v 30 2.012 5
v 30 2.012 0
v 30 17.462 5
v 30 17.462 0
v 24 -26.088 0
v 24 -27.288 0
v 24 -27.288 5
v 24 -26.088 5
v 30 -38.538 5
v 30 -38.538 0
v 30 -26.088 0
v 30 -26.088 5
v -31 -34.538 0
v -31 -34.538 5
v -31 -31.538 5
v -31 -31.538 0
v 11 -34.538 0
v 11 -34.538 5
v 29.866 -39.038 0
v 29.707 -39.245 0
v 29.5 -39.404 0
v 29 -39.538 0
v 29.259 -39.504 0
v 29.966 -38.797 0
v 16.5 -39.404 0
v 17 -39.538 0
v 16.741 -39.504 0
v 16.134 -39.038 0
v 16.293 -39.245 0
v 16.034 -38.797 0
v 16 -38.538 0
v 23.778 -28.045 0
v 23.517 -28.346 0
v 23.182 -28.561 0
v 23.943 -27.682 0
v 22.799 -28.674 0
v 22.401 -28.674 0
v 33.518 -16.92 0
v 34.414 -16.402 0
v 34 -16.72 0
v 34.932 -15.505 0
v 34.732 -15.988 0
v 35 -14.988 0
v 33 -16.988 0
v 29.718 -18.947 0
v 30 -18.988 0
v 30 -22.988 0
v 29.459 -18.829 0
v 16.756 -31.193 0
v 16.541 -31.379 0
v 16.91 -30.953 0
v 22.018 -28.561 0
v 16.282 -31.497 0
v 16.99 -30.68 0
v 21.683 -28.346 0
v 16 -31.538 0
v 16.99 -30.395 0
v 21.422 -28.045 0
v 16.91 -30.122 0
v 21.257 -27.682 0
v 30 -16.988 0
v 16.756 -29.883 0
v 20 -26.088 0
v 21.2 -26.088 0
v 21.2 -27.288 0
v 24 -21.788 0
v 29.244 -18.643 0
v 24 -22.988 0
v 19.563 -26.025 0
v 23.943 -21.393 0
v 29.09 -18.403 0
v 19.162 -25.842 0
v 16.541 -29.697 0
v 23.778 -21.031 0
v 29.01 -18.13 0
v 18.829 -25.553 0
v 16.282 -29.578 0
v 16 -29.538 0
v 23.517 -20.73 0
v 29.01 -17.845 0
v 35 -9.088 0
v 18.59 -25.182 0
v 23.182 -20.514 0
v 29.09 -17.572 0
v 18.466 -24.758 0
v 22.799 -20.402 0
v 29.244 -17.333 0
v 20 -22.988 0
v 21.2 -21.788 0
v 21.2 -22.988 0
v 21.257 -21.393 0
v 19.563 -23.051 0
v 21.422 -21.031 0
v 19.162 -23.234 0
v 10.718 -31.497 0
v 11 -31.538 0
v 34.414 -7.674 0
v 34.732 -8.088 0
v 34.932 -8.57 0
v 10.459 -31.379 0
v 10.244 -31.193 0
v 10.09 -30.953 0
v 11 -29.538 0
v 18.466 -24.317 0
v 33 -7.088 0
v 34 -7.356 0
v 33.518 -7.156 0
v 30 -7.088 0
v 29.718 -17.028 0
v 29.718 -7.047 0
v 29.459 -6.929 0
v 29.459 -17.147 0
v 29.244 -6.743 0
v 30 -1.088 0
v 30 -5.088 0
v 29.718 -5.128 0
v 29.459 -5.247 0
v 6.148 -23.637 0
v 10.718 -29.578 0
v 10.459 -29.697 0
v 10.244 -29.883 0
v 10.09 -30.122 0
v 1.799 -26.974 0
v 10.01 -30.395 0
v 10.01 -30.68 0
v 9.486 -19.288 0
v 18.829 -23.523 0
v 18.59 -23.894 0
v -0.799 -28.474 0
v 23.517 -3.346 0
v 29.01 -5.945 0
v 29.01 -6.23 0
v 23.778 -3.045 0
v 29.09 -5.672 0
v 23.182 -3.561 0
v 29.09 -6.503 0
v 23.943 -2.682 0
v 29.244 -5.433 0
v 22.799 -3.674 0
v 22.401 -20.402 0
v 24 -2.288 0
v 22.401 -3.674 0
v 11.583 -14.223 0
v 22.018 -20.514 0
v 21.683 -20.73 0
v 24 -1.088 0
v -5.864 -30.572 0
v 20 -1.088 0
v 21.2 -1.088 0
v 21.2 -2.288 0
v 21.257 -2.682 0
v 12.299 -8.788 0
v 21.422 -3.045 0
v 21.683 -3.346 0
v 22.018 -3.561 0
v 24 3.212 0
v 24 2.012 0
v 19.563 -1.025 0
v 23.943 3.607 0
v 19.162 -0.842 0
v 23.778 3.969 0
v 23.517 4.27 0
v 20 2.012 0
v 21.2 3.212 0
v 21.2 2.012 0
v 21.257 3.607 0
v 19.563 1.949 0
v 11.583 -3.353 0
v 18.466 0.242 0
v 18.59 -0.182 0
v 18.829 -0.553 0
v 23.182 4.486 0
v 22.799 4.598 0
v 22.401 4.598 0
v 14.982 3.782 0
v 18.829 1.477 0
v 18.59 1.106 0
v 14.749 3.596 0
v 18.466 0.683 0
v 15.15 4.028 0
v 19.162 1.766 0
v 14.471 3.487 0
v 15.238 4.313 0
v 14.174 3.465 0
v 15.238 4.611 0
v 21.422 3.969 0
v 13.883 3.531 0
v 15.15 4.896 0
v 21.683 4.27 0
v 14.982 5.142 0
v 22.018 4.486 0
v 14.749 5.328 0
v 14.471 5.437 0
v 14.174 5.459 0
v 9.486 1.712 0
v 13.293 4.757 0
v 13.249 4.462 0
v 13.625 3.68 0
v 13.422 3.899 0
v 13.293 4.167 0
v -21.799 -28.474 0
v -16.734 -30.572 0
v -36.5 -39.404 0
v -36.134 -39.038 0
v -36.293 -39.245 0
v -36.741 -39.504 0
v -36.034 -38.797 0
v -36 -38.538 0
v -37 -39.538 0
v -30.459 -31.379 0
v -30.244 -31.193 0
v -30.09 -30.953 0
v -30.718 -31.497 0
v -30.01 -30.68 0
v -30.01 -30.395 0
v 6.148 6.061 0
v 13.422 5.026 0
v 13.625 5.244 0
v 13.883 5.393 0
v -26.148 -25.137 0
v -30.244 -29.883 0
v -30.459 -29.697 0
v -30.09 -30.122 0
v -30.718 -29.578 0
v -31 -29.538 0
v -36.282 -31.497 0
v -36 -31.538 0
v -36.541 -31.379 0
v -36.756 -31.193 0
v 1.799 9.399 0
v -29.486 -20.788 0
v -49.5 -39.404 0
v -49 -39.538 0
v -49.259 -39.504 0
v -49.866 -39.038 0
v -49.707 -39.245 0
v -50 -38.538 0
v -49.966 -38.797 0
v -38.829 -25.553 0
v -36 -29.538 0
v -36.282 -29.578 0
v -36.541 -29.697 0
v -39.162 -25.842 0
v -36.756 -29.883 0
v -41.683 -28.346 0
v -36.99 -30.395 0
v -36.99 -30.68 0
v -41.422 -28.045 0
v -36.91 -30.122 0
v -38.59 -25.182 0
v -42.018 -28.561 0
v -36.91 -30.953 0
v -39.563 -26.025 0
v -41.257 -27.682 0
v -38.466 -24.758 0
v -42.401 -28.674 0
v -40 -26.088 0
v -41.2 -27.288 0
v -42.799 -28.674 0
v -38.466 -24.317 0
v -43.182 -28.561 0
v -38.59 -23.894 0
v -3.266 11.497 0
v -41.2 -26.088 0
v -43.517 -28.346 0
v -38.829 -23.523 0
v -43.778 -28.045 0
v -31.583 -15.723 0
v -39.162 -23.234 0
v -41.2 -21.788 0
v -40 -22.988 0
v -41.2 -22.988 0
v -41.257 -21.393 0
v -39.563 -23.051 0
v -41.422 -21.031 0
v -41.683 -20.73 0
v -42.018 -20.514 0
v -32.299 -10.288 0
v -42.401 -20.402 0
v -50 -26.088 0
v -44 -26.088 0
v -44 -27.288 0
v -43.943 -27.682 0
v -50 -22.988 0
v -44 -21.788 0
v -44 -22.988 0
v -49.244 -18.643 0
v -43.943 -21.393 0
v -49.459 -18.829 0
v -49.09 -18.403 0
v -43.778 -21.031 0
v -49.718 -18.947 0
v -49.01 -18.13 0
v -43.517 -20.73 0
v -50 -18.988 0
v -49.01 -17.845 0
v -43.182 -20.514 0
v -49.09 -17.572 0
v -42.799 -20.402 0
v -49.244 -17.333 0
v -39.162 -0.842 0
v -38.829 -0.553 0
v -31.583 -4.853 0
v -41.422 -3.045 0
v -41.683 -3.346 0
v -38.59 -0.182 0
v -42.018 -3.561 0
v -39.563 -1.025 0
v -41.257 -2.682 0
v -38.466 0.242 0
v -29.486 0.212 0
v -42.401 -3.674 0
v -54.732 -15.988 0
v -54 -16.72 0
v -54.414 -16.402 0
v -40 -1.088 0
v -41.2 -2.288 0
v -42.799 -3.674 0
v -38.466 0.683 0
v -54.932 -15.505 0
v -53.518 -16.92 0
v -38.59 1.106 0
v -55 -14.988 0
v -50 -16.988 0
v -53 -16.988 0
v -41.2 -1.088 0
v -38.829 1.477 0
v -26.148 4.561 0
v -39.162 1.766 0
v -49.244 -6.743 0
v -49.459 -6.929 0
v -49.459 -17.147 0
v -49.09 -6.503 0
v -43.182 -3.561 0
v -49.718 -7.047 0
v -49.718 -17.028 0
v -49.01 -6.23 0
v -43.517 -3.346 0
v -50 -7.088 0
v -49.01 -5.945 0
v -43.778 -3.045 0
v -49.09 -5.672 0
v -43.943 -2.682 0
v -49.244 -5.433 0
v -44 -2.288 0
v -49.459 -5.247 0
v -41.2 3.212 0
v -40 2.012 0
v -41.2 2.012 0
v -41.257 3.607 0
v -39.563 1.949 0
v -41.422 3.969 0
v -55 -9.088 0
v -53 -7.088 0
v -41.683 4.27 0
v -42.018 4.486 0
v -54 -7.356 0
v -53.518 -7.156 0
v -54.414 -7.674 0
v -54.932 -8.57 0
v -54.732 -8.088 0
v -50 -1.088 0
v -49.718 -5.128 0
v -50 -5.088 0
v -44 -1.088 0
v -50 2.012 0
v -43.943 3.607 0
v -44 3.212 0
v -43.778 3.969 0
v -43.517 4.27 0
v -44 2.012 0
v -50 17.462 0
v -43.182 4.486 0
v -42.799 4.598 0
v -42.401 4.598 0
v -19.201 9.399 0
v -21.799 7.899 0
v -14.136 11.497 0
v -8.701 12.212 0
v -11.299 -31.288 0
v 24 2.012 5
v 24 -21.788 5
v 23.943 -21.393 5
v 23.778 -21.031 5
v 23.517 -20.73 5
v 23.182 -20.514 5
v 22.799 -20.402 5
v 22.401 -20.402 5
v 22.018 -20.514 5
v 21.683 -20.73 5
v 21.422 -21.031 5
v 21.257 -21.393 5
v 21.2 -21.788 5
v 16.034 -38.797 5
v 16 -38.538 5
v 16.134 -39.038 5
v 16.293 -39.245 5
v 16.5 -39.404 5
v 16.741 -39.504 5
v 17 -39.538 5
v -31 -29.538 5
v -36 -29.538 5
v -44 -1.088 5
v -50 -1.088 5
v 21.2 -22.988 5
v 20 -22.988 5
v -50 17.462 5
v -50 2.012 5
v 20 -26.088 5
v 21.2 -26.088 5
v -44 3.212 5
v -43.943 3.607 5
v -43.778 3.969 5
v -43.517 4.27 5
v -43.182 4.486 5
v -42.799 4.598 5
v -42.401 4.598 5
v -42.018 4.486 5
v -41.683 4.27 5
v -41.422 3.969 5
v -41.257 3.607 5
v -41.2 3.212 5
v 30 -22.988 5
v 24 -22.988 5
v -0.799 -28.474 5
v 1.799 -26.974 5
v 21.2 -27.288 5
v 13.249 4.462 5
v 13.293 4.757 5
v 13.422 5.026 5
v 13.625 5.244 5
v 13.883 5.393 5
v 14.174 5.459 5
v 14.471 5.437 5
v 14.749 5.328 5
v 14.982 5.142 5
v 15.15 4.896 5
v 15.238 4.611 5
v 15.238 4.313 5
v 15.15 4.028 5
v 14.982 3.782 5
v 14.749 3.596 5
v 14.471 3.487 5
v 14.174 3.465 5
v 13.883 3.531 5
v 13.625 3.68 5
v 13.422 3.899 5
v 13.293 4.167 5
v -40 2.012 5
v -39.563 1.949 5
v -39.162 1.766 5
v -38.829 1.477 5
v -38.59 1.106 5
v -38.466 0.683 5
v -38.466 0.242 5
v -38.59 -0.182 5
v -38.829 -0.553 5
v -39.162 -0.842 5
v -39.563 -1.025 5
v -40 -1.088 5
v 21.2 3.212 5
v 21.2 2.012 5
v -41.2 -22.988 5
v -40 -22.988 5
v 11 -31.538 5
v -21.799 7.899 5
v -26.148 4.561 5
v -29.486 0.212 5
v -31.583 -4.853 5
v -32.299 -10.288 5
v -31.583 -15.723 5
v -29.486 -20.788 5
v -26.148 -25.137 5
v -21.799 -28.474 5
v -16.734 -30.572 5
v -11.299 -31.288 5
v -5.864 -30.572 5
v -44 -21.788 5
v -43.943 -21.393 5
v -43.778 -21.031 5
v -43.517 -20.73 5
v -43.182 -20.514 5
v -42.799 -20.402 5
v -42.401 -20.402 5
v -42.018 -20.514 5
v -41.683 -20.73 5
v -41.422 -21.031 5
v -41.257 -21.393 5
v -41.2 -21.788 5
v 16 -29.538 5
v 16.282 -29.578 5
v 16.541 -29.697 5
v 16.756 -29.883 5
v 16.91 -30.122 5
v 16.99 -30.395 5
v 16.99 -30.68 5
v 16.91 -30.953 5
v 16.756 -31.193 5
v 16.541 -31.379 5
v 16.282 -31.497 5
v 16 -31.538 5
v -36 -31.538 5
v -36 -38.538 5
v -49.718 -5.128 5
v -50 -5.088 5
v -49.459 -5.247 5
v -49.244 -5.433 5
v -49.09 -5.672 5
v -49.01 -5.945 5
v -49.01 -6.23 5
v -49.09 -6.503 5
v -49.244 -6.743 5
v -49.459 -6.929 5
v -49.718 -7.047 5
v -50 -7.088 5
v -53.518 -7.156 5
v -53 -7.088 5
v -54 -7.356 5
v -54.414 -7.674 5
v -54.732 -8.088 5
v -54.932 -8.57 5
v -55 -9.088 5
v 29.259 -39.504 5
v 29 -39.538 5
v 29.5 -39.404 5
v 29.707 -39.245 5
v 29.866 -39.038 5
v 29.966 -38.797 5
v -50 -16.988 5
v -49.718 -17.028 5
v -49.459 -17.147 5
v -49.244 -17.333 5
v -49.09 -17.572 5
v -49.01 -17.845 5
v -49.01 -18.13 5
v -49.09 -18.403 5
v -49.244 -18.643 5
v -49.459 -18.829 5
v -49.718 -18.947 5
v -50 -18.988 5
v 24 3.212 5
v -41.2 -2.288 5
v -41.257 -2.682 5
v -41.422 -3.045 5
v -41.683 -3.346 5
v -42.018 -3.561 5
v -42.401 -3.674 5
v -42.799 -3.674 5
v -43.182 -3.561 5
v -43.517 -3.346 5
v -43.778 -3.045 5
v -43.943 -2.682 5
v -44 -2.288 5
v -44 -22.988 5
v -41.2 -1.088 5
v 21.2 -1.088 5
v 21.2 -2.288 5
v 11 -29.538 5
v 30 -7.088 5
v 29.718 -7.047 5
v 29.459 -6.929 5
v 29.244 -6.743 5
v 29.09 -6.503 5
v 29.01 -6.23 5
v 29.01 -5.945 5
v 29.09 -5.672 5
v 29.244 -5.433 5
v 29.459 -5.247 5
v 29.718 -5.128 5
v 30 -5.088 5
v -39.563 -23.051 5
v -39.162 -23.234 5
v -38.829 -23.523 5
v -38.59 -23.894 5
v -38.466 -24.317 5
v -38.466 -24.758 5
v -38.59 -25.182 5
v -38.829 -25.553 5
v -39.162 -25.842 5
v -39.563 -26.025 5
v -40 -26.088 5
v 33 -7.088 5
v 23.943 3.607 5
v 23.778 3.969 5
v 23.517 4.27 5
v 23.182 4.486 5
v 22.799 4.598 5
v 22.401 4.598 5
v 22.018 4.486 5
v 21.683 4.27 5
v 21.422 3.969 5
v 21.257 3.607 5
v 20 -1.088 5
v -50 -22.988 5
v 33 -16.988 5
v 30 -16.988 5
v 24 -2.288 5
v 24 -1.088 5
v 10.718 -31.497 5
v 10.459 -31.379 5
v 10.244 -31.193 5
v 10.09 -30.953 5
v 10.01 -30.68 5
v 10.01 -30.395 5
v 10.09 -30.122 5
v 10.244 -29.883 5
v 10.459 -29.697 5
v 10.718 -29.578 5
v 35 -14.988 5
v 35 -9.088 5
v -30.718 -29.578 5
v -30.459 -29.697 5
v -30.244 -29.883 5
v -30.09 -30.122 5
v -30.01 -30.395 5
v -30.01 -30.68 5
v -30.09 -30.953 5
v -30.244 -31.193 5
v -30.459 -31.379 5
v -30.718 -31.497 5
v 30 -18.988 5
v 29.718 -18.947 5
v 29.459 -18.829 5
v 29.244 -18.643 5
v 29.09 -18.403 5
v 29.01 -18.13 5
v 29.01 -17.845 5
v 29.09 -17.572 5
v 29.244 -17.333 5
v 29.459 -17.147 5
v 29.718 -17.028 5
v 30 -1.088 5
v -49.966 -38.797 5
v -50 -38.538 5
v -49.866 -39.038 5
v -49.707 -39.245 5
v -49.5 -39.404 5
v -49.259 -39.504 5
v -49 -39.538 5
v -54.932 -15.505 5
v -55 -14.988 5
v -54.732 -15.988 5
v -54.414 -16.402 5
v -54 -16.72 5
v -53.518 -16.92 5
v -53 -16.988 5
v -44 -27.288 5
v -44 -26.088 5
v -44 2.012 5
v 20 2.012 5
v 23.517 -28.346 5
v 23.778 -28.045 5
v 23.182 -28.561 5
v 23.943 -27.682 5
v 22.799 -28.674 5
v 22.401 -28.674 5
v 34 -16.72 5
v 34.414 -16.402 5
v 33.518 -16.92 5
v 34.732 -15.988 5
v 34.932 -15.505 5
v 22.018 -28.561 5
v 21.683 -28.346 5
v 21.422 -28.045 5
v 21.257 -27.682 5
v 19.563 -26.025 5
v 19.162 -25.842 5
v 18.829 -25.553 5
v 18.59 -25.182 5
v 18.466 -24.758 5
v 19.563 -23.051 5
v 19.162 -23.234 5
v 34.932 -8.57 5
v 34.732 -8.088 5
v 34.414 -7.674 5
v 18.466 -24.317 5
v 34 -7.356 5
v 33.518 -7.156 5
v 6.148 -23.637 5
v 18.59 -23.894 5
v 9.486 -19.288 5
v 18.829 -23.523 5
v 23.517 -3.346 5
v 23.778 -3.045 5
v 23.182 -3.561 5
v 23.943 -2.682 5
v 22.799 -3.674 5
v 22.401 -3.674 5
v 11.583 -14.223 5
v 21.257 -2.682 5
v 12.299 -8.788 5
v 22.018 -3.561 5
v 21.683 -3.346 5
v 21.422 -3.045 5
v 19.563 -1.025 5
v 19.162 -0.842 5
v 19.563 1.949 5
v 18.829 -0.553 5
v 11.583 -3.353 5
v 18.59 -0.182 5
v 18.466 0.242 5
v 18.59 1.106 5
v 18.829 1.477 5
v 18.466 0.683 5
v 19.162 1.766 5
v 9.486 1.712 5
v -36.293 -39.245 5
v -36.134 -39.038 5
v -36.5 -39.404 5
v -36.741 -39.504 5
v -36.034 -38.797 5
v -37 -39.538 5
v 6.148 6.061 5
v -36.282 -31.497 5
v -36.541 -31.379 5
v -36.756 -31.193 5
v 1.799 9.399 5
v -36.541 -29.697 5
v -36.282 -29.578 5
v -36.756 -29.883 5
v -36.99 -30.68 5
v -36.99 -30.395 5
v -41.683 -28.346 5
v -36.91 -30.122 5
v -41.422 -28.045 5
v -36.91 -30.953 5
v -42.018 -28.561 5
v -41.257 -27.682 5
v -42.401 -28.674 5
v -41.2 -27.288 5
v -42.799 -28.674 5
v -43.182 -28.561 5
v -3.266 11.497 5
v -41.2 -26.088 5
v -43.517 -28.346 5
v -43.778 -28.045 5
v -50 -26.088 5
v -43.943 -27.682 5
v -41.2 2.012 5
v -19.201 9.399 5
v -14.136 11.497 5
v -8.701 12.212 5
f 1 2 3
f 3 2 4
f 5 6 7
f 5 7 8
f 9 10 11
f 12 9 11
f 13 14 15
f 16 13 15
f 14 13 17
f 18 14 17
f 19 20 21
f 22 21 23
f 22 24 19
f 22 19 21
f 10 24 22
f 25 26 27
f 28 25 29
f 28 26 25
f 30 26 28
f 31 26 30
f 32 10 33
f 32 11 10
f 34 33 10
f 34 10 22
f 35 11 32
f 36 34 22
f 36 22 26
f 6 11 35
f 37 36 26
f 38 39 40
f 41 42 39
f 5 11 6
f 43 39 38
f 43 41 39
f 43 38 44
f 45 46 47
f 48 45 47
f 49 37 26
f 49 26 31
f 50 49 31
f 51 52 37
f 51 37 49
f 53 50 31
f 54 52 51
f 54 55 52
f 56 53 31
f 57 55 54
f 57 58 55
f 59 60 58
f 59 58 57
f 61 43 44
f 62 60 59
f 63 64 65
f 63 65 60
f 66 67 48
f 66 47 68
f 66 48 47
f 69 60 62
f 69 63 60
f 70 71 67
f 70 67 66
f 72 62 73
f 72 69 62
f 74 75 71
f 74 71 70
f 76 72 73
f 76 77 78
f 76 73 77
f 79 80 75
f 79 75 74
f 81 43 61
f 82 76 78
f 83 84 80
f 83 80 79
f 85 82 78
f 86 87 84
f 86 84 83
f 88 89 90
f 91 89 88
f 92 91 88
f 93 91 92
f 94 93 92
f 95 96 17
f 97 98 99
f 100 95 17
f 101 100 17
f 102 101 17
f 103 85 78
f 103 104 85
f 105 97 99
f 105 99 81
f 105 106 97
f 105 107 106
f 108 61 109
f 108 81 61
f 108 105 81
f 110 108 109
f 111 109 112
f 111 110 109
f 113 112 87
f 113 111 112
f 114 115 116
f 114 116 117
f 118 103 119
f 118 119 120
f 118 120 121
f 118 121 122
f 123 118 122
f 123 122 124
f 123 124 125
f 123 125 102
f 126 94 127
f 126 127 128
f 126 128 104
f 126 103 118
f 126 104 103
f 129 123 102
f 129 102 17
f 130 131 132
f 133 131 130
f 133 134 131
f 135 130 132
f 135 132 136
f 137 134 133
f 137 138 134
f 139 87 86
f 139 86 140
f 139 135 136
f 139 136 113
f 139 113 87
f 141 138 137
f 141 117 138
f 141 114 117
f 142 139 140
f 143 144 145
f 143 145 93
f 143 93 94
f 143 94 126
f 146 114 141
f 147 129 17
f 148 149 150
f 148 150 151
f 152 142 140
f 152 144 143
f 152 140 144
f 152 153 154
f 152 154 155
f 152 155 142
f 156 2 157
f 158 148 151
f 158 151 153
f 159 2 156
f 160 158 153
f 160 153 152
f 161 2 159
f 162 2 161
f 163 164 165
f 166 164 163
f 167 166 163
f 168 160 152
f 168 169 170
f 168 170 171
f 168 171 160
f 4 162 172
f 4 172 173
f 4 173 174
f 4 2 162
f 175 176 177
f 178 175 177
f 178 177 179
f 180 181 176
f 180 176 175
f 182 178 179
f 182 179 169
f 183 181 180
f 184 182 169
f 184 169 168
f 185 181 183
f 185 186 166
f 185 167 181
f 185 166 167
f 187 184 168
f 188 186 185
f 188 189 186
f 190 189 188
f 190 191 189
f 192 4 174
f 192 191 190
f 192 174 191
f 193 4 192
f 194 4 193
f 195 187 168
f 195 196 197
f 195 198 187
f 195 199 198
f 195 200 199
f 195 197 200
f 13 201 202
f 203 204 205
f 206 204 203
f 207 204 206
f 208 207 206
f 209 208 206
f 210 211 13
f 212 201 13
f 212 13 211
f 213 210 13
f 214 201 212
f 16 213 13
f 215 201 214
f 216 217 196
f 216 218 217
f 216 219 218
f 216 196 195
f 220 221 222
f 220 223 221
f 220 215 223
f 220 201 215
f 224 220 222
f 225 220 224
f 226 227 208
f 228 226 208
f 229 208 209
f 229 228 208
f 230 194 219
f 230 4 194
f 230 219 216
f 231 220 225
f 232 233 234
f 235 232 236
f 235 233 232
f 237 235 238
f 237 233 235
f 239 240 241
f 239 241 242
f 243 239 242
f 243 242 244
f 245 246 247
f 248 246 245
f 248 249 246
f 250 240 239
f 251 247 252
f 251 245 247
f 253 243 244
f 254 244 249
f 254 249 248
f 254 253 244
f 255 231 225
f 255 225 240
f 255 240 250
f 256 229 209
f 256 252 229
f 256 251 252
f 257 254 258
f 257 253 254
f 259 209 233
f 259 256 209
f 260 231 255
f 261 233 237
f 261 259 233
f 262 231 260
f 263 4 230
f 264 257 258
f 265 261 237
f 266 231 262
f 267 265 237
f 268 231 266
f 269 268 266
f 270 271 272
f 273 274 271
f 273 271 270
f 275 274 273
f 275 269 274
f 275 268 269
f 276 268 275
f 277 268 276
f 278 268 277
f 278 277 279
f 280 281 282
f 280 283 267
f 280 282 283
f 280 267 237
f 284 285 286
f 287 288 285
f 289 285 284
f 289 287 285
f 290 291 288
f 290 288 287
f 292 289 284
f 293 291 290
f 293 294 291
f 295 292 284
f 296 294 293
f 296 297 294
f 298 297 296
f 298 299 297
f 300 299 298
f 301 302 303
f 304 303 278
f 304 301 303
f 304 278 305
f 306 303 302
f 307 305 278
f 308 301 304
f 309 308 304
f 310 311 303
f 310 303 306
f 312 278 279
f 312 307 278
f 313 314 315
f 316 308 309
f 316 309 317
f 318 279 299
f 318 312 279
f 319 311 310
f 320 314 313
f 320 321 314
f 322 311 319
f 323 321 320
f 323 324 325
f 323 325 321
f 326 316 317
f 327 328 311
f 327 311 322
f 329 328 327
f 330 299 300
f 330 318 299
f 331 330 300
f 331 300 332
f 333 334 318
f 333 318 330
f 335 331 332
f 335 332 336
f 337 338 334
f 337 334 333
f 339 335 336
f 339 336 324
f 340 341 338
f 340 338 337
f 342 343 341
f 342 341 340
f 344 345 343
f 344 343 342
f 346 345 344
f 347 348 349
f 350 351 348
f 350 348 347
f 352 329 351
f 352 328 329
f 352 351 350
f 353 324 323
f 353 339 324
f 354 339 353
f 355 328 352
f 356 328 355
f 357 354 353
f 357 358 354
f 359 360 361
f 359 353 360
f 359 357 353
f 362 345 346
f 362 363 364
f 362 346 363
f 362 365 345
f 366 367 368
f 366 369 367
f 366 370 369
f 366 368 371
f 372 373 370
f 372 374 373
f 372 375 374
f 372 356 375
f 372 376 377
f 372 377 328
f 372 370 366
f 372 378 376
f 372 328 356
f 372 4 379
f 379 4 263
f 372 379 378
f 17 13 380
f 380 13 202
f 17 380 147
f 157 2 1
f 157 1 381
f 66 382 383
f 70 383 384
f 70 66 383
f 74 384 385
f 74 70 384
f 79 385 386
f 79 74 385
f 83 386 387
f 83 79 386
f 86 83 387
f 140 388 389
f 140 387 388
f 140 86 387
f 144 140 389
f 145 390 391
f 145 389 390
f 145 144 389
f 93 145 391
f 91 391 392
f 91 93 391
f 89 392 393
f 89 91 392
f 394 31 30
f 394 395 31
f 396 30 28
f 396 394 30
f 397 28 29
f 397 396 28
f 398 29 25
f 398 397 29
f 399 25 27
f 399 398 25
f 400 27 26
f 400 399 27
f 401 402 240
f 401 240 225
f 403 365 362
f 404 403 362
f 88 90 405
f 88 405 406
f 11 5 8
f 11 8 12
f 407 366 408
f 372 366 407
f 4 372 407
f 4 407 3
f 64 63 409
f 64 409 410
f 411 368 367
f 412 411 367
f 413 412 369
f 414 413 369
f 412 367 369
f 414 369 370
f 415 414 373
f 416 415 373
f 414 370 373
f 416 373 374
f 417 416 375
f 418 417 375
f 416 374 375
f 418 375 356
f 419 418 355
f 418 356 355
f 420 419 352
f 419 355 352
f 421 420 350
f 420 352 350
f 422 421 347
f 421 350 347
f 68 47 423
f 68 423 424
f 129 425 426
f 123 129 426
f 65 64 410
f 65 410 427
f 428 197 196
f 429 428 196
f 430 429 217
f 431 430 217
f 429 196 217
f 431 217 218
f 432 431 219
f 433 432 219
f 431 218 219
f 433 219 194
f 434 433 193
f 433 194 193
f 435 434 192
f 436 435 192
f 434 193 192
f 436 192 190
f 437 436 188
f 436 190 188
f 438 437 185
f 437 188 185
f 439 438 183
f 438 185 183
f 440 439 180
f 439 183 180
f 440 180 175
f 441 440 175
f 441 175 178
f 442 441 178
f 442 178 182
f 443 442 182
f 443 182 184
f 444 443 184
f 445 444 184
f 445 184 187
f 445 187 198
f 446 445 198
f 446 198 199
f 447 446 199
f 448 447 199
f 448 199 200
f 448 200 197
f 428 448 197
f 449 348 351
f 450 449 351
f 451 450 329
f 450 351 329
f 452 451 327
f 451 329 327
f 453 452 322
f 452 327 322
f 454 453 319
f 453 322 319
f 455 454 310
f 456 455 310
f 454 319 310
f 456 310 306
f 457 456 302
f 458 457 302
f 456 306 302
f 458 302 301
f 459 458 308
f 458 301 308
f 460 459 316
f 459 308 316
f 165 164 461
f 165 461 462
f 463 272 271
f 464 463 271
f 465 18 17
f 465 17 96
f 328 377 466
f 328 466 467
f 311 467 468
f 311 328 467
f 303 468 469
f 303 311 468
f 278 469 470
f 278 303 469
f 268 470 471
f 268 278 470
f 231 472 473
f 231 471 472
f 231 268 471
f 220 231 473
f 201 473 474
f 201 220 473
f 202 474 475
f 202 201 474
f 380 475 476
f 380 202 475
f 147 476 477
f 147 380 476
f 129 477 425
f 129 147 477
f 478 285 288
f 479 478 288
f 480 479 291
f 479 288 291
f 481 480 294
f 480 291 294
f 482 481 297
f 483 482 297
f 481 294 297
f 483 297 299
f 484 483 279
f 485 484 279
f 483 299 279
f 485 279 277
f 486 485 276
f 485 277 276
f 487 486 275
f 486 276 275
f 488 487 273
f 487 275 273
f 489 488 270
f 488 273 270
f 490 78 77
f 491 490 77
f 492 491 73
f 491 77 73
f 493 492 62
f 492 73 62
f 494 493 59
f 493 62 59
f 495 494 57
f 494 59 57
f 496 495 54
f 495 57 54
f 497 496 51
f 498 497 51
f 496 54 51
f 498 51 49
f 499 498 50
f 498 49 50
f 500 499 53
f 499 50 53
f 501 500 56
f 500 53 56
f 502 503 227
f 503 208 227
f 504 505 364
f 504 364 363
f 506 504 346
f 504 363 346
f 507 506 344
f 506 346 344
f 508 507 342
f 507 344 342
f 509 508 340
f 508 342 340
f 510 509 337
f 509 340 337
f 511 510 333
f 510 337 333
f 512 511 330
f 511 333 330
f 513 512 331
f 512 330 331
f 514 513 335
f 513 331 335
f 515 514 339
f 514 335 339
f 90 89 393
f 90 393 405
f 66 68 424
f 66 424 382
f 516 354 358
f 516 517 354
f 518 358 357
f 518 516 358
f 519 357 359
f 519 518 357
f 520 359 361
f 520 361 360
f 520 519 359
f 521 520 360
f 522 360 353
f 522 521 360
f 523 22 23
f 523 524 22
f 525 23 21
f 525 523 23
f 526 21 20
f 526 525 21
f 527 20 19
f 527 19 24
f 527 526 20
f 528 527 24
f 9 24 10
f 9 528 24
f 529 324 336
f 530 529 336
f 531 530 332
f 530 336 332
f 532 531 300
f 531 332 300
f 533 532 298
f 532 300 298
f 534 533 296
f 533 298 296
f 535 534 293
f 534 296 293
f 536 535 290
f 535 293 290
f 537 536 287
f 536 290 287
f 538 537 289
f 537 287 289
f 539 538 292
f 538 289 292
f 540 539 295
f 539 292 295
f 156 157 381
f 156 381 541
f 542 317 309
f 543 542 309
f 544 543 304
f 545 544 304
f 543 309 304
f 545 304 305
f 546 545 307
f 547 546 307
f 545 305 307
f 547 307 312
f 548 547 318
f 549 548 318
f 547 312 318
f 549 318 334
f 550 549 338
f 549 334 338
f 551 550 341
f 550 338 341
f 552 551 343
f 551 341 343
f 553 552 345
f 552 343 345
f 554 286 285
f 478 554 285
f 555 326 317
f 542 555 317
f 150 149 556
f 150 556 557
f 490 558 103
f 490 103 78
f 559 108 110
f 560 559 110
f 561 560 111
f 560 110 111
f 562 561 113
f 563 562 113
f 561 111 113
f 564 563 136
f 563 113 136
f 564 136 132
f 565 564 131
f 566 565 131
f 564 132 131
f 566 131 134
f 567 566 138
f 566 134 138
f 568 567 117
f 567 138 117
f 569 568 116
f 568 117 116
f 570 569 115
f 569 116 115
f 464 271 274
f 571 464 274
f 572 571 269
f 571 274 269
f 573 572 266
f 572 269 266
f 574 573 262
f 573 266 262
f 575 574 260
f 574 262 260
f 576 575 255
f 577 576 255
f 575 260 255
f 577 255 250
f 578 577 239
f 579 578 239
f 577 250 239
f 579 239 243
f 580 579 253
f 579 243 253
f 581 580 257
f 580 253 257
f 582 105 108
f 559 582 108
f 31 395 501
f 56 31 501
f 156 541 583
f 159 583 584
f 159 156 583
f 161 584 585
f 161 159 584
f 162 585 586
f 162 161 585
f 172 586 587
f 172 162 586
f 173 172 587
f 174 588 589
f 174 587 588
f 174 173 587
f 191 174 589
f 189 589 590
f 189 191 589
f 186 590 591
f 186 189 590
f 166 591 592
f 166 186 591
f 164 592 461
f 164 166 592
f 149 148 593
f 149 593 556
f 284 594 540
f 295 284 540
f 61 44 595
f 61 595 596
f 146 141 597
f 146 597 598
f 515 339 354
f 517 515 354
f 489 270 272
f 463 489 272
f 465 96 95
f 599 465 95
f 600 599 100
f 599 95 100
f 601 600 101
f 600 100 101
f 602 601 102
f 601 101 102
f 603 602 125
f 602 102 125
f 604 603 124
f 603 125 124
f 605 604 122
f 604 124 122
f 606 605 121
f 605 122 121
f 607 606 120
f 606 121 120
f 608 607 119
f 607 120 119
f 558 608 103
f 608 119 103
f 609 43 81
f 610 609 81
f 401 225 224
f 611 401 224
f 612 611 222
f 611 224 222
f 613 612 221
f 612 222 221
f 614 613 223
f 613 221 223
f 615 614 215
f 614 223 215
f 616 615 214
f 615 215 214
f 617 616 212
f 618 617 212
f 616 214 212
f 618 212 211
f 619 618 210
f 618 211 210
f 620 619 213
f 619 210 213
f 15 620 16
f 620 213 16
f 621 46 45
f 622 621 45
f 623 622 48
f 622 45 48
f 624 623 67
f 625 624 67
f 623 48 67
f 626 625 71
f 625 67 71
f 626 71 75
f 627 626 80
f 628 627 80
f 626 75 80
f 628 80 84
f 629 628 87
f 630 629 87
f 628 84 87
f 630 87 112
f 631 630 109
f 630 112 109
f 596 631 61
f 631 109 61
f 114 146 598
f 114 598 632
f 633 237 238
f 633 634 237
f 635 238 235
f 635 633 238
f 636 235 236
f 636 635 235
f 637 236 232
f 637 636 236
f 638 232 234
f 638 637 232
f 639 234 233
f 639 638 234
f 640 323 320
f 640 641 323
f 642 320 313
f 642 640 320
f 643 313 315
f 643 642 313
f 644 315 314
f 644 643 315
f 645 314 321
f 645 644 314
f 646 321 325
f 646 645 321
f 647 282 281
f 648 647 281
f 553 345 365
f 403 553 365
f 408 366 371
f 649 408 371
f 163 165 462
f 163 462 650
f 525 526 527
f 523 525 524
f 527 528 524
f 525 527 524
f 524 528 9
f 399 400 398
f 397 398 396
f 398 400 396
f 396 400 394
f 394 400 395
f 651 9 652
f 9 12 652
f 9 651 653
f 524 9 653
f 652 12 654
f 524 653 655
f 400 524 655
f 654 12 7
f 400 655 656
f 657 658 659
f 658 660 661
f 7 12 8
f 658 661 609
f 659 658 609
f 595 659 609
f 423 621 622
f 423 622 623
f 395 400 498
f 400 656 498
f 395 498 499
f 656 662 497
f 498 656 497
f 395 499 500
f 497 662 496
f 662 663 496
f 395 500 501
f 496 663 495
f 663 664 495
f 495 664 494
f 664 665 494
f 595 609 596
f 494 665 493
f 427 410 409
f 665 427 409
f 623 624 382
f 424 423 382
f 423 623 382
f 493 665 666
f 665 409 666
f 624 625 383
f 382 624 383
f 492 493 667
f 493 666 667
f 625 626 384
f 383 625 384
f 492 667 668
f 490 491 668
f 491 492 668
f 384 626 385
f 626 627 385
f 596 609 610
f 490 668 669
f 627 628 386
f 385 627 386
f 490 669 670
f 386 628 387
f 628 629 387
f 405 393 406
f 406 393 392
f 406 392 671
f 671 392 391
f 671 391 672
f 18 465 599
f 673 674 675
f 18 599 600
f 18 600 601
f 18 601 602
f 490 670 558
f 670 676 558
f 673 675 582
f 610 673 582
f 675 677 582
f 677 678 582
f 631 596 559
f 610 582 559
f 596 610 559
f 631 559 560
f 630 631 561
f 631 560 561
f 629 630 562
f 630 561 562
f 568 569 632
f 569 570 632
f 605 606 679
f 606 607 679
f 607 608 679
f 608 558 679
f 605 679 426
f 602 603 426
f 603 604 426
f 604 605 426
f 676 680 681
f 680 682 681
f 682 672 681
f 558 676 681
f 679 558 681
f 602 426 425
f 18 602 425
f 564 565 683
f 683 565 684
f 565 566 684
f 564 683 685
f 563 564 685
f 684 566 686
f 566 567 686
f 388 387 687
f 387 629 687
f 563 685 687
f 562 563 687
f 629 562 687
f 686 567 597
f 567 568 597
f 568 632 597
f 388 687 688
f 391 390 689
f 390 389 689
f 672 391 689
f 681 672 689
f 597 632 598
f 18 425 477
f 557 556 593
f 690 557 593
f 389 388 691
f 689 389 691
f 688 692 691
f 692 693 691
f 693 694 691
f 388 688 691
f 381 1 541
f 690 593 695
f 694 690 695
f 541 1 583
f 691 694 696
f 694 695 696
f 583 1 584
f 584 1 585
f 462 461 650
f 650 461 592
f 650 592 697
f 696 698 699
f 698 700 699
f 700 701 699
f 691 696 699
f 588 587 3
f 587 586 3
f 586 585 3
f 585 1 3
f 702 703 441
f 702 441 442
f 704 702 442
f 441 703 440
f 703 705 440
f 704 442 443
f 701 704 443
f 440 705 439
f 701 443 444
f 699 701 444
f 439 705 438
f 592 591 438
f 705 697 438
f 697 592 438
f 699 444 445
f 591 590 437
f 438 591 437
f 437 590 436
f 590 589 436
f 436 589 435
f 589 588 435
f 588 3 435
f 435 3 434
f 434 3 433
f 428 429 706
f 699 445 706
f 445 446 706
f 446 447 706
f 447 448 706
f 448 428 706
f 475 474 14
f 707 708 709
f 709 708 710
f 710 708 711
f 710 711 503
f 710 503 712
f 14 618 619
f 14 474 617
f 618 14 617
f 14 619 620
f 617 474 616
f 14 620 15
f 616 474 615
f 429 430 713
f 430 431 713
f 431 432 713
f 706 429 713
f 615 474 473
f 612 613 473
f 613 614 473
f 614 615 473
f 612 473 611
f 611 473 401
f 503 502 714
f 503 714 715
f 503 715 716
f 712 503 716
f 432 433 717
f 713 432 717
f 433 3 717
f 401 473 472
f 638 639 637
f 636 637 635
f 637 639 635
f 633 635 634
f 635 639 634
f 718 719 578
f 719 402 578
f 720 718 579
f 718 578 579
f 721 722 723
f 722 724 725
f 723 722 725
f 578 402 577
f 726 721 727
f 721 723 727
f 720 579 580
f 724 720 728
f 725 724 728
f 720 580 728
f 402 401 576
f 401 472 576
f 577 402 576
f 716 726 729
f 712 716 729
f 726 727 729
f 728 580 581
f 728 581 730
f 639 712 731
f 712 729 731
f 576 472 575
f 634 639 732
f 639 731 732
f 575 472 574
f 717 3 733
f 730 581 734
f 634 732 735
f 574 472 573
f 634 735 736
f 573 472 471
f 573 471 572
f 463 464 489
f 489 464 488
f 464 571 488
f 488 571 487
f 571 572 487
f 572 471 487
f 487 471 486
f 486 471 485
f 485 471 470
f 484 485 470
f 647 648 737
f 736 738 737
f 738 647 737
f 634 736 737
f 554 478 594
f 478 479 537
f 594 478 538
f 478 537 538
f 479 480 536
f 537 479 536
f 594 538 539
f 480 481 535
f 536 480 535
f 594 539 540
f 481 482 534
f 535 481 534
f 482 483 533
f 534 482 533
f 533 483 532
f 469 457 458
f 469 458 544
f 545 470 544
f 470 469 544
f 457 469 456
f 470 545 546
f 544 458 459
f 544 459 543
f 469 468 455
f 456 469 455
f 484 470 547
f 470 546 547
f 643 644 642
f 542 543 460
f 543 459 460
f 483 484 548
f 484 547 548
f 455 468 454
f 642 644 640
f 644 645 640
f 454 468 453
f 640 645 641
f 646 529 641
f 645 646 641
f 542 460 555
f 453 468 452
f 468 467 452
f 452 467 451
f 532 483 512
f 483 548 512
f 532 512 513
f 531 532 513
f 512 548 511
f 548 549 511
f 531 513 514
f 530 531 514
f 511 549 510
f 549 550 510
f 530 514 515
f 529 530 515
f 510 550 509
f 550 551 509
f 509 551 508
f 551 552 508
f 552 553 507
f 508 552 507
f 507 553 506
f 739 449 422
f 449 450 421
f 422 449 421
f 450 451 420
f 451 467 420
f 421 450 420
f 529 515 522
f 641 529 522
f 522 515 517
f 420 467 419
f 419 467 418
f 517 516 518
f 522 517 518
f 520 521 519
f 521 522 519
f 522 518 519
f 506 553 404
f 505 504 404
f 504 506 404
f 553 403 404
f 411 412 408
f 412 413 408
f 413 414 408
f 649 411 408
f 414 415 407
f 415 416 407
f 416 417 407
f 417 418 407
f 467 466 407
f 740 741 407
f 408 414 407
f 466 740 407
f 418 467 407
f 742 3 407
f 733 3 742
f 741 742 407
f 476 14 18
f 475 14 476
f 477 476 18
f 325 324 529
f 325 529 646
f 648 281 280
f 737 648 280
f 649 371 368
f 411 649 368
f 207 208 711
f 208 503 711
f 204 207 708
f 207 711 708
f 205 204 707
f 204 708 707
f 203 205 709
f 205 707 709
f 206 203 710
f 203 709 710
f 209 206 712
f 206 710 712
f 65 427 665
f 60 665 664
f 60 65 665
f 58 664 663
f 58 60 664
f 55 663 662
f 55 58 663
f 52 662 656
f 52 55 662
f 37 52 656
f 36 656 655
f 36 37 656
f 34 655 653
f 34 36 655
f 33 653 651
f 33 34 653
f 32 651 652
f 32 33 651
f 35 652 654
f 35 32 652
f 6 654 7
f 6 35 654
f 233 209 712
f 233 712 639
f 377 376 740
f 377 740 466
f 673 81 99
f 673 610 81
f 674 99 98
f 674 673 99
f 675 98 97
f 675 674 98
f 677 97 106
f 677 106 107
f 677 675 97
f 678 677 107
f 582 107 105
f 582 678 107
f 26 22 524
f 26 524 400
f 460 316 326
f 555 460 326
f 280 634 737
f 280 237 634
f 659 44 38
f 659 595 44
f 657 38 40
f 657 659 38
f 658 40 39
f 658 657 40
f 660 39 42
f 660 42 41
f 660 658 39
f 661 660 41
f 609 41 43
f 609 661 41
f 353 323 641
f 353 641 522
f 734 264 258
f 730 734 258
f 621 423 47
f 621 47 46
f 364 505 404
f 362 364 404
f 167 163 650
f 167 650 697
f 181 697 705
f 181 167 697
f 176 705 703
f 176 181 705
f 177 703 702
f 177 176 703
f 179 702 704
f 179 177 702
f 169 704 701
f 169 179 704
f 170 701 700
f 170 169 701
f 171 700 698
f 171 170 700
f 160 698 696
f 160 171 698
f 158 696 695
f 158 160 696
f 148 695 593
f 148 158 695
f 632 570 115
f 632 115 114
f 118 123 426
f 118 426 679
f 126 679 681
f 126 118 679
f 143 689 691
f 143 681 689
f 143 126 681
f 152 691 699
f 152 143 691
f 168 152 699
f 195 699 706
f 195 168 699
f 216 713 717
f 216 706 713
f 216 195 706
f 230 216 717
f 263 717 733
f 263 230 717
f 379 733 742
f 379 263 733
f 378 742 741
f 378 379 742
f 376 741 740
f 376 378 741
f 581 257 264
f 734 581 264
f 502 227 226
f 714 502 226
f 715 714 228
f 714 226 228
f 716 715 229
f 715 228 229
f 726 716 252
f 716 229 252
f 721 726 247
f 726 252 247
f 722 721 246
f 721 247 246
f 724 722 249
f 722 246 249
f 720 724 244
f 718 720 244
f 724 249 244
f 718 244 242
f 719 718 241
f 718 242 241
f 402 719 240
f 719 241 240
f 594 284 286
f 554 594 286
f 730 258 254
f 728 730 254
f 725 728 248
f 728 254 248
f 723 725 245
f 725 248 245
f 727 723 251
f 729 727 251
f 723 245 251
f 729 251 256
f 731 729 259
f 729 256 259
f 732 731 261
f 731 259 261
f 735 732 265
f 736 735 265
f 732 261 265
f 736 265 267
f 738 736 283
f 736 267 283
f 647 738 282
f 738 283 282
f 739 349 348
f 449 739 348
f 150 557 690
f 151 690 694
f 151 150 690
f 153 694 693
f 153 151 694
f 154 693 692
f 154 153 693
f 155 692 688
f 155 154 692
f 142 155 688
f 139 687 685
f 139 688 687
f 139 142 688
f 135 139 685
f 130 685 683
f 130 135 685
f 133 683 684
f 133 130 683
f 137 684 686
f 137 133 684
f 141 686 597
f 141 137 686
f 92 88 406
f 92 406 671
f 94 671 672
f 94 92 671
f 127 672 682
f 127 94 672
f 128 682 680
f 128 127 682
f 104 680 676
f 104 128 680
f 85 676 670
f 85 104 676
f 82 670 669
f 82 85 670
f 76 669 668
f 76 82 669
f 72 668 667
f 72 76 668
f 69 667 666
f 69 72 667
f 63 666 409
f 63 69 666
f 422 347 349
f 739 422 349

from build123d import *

# Parameters (mm, degrees)
SKETCH_1_W          = 80
SKETCH_1_H          = 52
EXTRUDE_1_DEPTH     = 5
CUT_EXTRUDE_3_DEPTH = 10
CUT_EXTRUDE_4_DEPTH = 10
SKETCH_9_R          = 1
CUT_EXTRUDE_5_DEPTH = 10
SKETCH_10_W         = 5
SKETCH_10_H         = 5
CUT_EXTRUDE_6_DEPTH = 10
SKETCH_11_R         = 1
CUT_EXTRUDE_7_DEPTH = 10
SKETCH_12_W         = 5
SKETCH_12_H         = 9.9
EXTRUDE_4_DEPTH     = 5
SKETCH_13_R         = 1
CUT_EXTRUDE_8_DEPTH = 5
FILLET_2_R          = 2
SKETCH_14_W         = 14
SKETCH_14_H         = 5
EXTRUDE_5_DEPTH     = 5
FILLET_3_R          = 1


with BuildPart() as part:
    # 스케치1 → 보스-돌출1 (new body)
    with BuildSketch(Plane.XY):
        with Locations((-10, -8.537755654)):
            Rectangle(SKETCH_1_W, SKETCH_1_H)
    extrude(amount=EXTRUDE_1_DEPTH)

    # 스케치7 → 컷-돌출3 (cut)
    with BuildSketch(Plane(origin=(0, 0, 0), x_dir=(-1, 0, 0), z_dir=(0, 0, -1))):
        with BuildLine():
            Line((-30, 2.012244346), (-24, 2.012244346))
            Line((-24, 2.012244346), (-24, 3.212244346))
            ThreePointArc((-24, 3.212244346), (-22.6, 4.612244346), (-21.2, 3.212244346))
            Line((-21.2, 3.212244346), (-21.2, 2.012244346))
            Line((-21.2, 2.012244346), (-20, 2.012244346))
            ThreePointArc((-20, 2.012244346), (-18.45, 0.462244346), (-20, -1.087755654))
            Line((-20, -1.087755654), (-21.2, -1.087755654))
            Line((-21.2, -1.087755654), (-21.2, -2.287755654))
            ThreePointArc((-21.2, -2.287755654), (-22.6, -3.687755654), (-24, -2.287755654))
            Line((-24, -2.287755654), (-24, -1.087755654))
            Line((-24, -1.087755654), (-30, -1.087755654))
            Line((-30, -1.087755654), (-30, 2.012244346))
        make_face()
        with BuildLine():
            Line((-30, -22.987755654), (-24, -22.987755654))
            Line((-24, -22.987755654), (-24, -21.787755654))
            ThreePointArc((-24, -21.787755654), (-22.6, -20.387755654), (-21.2, -21.787755654))
            Line((-21.2, -21.787755654), (-21.2, -22.987755654))
            Line((-21.2, -22.987755654), (-20, -22.987755654))
            ThreePointArc((-20, -22.987755654), (-18.45, -24.537755654), (-20, -26.087755654))
            Line((-20, -26.087755654), (-21.2, -26.087755654))
            Line((-21.2, -26.087755654), (-21.2, -27.287755654))
            ThreePointArc((-21.2, -27.287755654), (-22.6, -28.687755654), (-24, -27.287755654))
            Line((-24, -27.287755654), (-24, -26.087755654))
            Line((-24, -26.087755654), (-30, -26.087755654))
            Line((-30, -26.087755654), (-30, -22.987755654))
        make_face()
        with BuildLine():
            Line((44, -27.287755654), (44, -26.087755654))
            Line((44, -26.087755654), (50, -26.087755654))
            Line((50, -26.087755654), (50, -22.987755654))
            Line((50, -22.987755654), (44, -22.987755654))
            Line((44, -22.987755654), (44, -21.787755654))
            ThreePointArc((44, -21.787755654), (42.6, -20.387755654), (41.2, -21.787755654))
            Line((41.2, -21.787755654), (41.2, -22.987755654))
            Line((41.2, -22.987755654), (40, -22.987755654))
            ThreePointArc((40, -22.987755654), (38.45, -24.537755654), (40, -26.087755654))
            Line((40, -26.087755654), (41.2, -26.087755654))
            Line((41.2, -26.087755654), (41.2, -27.287755654))
            ThreePointArc((41.2, -27.287755654), (42.6, -28.687755654), (44, -27.287755654))
        make_face()
        with BuildLine():
            Line((44, -2.287755654), (44, -1.087755654))
            Line((44, -1.087755654), (50, -1.087755654))
            Line((50, -1.087755654), (50, 2.012244346))
            Line((50, 2.012244346), (44, 2.012244346))
            Line((44, 2.012244346), (44, 3.212244346))
            ThreePointArc((44, 3.212244346), (42.6, 4.612244346), (41.2, 3.212244346))
            Line((41.2, 3.212244346), (41.2, 2.012244346))
            Line((41.2, 2.012244346), (40, 2.012244346))
            ThreePointArc((40, 2.012244346), (38.45, 0.462244346), (40, -1.087755654))
            Line((40, -1.087755654), (41.2, -1.087755654))
            Line((41.2, -1.087755654), (41.2, -2.287755654))
            ThreePointArc((41.2, -2.287755654), (42.6, -3.687755654), (44, -2.287755654))
        make_face()
    extrude(amount=-CUT_EXTRUDE_3_DEPTH, mode=Mode.SUBTRACT)

    # 스케치8 → 컷-돌출4 (cut)
    with BuildSketch(Plane(origin=(0, 0, 0), x_dir=(-1, 0, 0), z_dir=(0, 0, -1))):
        with BuildLine():
            Line((19.200961894, 9.398777825), (21.799038106, 7.898777825))
            ThreePointArc((21.799038106, 7.898777825), (29.485571585, -20.787755654), (0.799038106, -28.474289134))
            Line((0.799038106, -28.474289134), (-1.799038106, -26.974289134))
            ThreePointArc((-1.799038106, -26.974289134), (-9.485571585, 1.712244346), (19.200961894, 9.398777825))
        make_face()
    extrude(amount=-CUT_EXTRUDE_4_DEPTH, mode=Mode.SUBTRACT)

    # 스케치9 → 컷-돌출5 (cut)
    with BuildSketch(Plane(origin=(0, 0, 0), x_dir=(-1, 0, 0), z_dir=(0, 0, -1))):
        with Locations((-14.248711306, 4.462244346)):
            Circle(SKETCH_9_R)
    extrude(amount=-CUT_EXTRUDE_5_DEPTH, mode=Mode.SUBTRACT)

    # 스케치10 → 컷-돌출6 (cut)
    with BuildSketch(Plane.XY.offset(5)):
        with Locations((13.5, -32.037755654)):
            Rectangle(SKETCH_10_W, SKETCH_10_H)
        with Locations((-33.5, -32.037755654)):
            Rectangle(SKETCH_10_W, SKETCH_10_H)
    extrude(amount=-CUT_EXTRUDE_6_DEPTH, mode=Mode.SUBTRACT)

    # 스케치11 → 컷-돌출7 (cut)
    with BuildSketch(Plane(origin=(0, 0, 0), x_dir=(-1, 0, 0), z_dir=(0, 0, -1))):
        with Locations((-11, -30.537755654)):
            Circle(SKETCH_11_R)
        with Locations((-16, -30.537755654)):
            Circle(SKETCH_11_R)
        with Locations((31, -30.537755654)):
            Circle(SKETCH_11_R)
        with Locations((36, -30.537755654)):
            Circle(SKETCH_11_R)
    extrude(amount=-CUT_EXTRUDE_7_DEPTH, mode=Mode.SUBTRACT)

    # 스케치12 → 보스-돌출4 (add)
    with BuildSketch(Plane(origin=(0, 0, 0), x_dir=(-1, 0, 0), z_dir=(0, 0, -1))):
        with Locations((52.5, -12.037755654)):
            Rectangle(SKETCH_12_W, SKETCH_12_H)
        with Locations((-32.5, -12.037755654)):
            Rectangle(SKETCH_12_W, SKETCH_12_H)
    extrude(amount=-EXTRUDE_4_DEPTH)

    # 스케치13 → 컷-돌출8 (cut)
    with BuildSketch(Plane(origin=(0, 0, 0), x_dir=(-1, 0, 0), z_dir=(0, 0, -1))):
        with Locations((50, -6.087755654)):
            Circle(SKETCH_13_R)
        with Locations((50, -17.987755654)):
            Circle(SKETCH_13_R)
        with Locations((-30, -6.087755654)):
            Circle(SKETCH_13_R)
        with Locations((-30, -17.987755654)):
            Circle(SKETCH_13_R)
    extrude(amount=-CUT_EXTRUDE_8_DEPTH, mode=Mode.SUBTRACT)

    # 필렛2
    fillet_2_edges = [part.edges().sort_by_distance(p)[0] for p in [
        (-55, -7.087755654, 2.5),
        (-55, -16.987755654, 2.5),
        (35, -7.087755654, 2.5),
        (35, -16.987755654, 2.5),
    ]]
    fillet(fillet_2_edges, radius=FILLET_2_R)

    # 스케치14 → 보스-돌출5 (add)
    with BuildSketch(Plane(origin=(0, 0, 0), x_dir=(-1, 0, 0), z_dir=(0, 0, -1))):
        with Locations((43, -37.037755654)):
            Rectangle(SKETCH_14_W, SKETCH_14_H)
        with Locations((-23, -37.037755654)):
            Rectangle(SKETCH_14_W, SKETCH_14_H)
    extrude(amount=-EXTRUDE_5_DEPTH)

    # 필렛3
    fillet_3_edges = [part.edges().sort_by_distance(p)[0] for p in [
        (-50, -39.537755654, 2.5),
        (-36, -39.537755654, 2.5),
        (16, -39.537755654, 2.5),
        (30, -39.537755654, 2.5),
    ]]
    fillet(fillet_3_edges, radius=FILLET_3_R)


solid = part.part
